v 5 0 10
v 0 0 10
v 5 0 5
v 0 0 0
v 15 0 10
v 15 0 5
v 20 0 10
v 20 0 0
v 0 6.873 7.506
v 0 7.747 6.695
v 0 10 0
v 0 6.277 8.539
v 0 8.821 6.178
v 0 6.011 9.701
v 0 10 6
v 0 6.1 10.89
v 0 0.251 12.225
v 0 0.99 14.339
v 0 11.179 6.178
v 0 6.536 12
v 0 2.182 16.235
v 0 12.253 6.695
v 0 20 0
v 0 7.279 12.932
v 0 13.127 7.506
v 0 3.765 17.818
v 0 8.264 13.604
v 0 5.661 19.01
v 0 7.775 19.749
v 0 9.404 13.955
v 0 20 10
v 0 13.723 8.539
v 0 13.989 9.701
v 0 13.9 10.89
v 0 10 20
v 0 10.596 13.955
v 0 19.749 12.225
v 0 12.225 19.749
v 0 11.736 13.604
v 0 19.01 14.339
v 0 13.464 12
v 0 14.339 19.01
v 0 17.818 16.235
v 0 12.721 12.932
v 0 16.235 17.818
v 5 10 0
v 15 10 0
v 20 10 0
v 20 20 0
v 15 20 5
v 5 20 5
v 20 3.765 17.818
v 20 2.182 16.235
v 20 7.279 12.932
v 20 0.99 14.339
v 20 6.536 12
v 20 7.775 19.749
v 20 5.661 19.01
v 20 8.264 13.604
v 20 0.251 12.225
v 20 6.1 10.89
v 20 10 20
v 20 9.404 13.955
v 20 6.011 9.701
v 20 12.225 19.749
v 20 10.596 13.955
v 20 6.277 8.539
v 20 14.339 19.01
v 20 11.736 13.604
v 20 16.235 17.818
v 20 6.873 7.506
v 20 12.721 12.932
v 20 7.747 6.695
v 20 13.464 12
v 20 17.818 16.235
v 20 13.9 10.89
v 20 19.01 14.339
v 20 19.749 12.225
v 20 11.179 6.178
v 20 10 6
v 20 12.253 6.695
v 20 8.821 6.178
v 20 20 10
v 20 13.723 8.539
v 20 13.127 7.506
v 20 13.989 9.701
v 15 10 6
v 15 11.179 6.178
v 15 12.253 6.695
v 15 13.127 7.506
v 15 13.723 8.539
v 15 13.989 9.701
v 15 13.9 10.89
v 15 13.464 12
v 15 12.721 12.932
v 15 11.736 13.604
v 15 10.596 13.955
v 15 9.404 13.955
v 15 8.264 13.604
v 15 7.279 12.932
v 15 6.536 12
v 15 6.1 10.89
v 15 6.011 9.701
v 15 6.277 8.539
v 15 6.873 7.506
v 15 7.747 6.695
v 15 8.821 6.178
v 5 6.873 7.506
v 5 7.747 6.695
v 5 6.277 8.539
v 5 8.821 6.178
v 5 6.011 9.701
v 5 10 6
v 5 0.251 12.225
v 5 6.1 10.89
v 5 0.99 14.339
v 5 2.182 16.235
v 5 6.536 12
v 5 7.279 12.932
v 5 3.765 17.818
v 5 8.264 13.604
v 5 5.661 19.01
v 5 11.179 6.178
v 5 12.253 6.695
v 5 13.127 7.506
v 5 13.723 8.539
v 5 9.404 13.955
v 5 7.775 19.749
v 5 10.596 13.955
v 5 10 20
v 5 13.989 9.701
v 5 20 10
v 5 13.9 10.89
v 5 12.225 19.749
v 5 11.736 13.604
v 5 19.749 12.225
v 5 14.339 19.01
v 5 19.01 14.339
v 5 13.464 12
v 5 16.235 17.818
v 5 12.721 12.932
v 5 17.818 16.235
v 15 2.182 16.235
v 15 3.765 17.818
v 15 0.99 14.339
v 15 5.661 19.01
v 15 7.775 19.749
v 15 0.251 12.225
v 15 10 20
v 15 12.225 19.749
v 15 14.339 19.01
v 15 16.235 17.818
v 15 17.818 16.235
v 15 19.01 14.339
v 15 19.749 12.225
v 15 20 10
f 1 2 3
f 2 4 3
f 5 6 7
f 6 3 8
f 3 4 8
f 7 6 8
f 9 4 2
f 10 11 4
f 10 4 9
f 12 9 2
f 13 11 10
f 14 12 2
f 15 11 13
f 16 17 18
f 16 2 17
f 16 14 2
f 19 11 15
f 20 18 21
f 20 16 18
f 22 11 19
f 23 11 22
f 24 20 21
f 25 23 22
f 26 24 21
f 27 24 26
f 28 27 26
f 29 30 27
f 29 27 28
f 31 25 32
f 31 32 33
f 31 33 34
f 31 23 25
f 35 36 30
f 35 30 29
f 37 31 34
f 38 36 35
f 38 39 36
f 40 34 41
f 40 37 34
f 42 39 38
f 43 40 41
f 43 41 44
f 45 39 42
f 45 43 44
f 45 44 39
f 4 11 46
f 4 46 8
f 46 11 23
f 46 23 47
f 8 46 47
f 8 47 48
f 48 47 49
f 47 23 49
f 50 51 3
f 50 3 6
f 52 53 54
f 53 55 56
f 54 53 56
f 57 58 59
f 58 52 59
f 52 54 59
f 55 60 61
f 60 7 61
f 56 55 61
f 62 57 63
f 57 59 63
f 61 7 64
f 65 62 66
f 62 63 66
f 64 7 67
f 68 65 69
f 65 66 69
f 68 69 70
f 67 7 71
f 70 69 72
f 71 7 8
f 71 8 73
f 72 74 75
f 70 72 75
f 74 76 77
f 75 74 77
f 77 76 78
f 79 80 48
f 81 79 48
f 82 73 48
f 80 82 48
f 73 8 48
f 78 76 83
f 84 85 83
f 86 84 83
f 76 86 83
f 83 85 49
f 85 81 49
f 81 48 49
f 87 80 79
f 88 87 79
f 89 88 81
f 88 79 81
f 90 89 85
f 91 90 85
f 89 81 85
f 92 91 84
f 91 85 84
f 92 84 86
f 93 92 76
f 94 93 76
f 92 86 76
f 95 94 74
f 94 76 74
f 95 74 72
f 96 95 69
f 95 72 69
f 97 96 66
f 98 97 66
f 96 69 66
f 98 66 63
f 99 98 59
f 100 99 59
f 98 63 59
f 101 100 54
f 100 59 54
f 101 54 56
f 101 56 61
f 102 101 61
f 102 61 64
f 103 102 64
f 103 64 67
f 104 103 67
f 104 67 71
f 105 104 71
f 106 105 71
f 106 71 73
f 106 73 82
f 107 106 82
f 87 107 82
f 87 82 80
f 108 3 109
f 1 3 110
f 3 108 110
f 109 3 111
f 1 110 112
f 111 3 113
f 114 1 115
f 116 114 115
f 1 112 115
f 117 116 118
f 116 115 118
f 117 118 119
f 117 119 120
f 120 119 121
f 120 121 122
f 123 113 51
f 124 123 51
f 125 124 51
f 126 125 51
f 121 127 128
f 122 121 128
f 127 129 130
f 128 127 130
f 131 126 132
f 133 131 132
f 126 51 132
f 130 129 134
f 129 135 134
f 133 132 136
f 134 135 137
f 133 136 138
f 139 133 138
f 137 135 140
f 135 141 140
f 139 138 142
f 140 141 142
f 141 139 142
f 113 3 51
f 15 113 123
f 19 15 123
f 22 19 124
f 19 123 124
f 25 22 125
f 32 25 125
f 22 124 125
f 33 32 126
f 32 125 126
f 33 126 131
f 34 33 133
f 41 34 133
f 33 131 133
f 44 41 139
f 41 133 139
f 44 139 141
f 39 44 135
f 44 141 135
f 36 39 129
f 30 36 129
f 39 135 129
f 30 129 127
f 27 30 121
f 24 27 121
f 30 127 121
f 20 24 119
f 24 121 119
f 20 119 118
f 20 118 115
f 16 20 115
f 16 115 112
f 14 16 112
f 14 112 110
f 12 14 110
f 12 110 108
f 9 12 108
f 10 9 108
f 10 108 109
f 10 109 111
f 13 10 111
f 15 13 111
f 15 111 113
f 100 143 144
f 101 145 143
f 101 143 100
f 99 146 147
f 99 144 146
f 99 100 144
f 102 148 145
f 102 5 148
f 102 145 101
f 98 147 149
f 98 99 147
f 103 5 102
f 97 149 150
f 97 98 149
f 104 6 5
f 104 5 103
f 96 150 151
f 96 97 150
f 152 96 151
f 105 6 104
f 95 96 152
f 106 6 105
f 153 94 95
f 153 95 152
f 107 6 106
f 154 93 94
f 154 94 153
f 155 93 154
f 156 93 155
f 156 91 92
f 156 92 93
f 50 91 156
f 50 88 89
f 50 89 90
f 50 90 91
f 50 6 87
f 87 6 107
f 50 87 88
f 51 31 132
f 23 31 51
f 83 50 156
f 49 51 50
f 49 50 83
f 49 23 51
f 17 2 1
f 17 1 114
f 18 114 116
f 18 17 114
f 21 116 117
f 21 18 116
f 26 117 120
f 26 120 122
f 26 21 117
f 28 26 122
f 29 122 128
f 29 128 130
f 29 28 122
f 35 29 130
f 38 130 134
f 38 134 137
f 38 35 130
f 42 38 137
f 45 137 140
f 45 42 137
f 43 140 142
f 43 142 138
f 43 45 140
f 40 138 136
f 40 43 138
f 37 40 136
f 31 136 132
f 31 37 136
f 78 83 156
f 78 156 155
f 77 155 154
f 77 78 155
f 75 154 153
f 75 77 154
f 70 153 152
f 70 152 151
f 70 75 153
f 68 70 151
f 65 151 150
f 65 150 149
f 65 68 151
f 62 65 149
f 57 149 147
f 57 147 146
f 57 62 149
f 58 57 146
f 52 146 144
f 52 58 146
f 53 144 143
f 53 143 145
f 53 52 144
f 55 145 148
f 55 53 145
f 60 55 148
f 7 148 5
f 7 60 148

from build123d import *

# Parameters (mm, degrees)
SKETCH1_W           = 20
SKETCH1_H           = 20
BOSS_EXTRUDE1_DEPTH = 5
SKETCH2_W           = 5
SKETCH2_H           = 20
BOSS_EXTRUDE2_DEPTH = 5
SKETCH3_R           = 10
BOSS_EXTRUDE5_DEPTH = 5
SKETCH6_R           = 10
BOSS_EXTRUDE6_DEPTH = 5
SKETCH5_R           = 4
CUT_EXTRUDE1_DEPTH  = 21


with BuildPart() as part:
    # Sketch1 → Boss-Extrude1 (new body)
    with BuildSketch(Plane.XY):
        with Locations((10, 10)):
            Rectangle(SKETCH1_W, SKETCH1_H)
    extrude(amount=BOSS_EXTRUDE1_DEPTH)

    # Sketch2 → Boss-Extrude2 (add)
    with BuildSketch(Plane.XY.offset(5)):
        with Locations((2.5, 10)):
            Rectangle(SKETCH2_W, SKETCH2_H)
        with Locations((17.5, 10)):
            Rectangle(SKETCH2_W, SKETCH2_H)
    extrude(amount=BOSS_EXTRUDE2_DEPTH)

    # Sketch3 → Boss-Extrude5 (add)
    with BuildSketch(Plane(origin=(20, 0, 0), x_dir=(0, 0, -1), z_dir=(1, 0, 0))):
        with Locations((-10, 10)):
            Circle(SKETCH3_R)
    extrude(amount=-BOSS_EXTRUDE5_DEPTH)

    # Sketch6 → Boss-Extrude6 (add)
    with BuildSketch(Plane.ZY):
        with Locations((10, 10)):
            Circle(SKETCH6_R)
    extrude(amount=-BOSS_EXTRUDE6_DEPTH)

    # Sketch5 → Cut-Extrude1 (cut, through all)
    with BuildSketch(Plane(origin=(20, 0, 0), x_dir=(0, 0, -1), z_dir=(1, 0, 0))):
        with Locations((-10, 10)):
            Circle(SKETCH5_R)
    extrude(amount=-CUT_EXTRUDE1_DEPTH, mode=Mode.SUBTRACT)


solid = part.part
